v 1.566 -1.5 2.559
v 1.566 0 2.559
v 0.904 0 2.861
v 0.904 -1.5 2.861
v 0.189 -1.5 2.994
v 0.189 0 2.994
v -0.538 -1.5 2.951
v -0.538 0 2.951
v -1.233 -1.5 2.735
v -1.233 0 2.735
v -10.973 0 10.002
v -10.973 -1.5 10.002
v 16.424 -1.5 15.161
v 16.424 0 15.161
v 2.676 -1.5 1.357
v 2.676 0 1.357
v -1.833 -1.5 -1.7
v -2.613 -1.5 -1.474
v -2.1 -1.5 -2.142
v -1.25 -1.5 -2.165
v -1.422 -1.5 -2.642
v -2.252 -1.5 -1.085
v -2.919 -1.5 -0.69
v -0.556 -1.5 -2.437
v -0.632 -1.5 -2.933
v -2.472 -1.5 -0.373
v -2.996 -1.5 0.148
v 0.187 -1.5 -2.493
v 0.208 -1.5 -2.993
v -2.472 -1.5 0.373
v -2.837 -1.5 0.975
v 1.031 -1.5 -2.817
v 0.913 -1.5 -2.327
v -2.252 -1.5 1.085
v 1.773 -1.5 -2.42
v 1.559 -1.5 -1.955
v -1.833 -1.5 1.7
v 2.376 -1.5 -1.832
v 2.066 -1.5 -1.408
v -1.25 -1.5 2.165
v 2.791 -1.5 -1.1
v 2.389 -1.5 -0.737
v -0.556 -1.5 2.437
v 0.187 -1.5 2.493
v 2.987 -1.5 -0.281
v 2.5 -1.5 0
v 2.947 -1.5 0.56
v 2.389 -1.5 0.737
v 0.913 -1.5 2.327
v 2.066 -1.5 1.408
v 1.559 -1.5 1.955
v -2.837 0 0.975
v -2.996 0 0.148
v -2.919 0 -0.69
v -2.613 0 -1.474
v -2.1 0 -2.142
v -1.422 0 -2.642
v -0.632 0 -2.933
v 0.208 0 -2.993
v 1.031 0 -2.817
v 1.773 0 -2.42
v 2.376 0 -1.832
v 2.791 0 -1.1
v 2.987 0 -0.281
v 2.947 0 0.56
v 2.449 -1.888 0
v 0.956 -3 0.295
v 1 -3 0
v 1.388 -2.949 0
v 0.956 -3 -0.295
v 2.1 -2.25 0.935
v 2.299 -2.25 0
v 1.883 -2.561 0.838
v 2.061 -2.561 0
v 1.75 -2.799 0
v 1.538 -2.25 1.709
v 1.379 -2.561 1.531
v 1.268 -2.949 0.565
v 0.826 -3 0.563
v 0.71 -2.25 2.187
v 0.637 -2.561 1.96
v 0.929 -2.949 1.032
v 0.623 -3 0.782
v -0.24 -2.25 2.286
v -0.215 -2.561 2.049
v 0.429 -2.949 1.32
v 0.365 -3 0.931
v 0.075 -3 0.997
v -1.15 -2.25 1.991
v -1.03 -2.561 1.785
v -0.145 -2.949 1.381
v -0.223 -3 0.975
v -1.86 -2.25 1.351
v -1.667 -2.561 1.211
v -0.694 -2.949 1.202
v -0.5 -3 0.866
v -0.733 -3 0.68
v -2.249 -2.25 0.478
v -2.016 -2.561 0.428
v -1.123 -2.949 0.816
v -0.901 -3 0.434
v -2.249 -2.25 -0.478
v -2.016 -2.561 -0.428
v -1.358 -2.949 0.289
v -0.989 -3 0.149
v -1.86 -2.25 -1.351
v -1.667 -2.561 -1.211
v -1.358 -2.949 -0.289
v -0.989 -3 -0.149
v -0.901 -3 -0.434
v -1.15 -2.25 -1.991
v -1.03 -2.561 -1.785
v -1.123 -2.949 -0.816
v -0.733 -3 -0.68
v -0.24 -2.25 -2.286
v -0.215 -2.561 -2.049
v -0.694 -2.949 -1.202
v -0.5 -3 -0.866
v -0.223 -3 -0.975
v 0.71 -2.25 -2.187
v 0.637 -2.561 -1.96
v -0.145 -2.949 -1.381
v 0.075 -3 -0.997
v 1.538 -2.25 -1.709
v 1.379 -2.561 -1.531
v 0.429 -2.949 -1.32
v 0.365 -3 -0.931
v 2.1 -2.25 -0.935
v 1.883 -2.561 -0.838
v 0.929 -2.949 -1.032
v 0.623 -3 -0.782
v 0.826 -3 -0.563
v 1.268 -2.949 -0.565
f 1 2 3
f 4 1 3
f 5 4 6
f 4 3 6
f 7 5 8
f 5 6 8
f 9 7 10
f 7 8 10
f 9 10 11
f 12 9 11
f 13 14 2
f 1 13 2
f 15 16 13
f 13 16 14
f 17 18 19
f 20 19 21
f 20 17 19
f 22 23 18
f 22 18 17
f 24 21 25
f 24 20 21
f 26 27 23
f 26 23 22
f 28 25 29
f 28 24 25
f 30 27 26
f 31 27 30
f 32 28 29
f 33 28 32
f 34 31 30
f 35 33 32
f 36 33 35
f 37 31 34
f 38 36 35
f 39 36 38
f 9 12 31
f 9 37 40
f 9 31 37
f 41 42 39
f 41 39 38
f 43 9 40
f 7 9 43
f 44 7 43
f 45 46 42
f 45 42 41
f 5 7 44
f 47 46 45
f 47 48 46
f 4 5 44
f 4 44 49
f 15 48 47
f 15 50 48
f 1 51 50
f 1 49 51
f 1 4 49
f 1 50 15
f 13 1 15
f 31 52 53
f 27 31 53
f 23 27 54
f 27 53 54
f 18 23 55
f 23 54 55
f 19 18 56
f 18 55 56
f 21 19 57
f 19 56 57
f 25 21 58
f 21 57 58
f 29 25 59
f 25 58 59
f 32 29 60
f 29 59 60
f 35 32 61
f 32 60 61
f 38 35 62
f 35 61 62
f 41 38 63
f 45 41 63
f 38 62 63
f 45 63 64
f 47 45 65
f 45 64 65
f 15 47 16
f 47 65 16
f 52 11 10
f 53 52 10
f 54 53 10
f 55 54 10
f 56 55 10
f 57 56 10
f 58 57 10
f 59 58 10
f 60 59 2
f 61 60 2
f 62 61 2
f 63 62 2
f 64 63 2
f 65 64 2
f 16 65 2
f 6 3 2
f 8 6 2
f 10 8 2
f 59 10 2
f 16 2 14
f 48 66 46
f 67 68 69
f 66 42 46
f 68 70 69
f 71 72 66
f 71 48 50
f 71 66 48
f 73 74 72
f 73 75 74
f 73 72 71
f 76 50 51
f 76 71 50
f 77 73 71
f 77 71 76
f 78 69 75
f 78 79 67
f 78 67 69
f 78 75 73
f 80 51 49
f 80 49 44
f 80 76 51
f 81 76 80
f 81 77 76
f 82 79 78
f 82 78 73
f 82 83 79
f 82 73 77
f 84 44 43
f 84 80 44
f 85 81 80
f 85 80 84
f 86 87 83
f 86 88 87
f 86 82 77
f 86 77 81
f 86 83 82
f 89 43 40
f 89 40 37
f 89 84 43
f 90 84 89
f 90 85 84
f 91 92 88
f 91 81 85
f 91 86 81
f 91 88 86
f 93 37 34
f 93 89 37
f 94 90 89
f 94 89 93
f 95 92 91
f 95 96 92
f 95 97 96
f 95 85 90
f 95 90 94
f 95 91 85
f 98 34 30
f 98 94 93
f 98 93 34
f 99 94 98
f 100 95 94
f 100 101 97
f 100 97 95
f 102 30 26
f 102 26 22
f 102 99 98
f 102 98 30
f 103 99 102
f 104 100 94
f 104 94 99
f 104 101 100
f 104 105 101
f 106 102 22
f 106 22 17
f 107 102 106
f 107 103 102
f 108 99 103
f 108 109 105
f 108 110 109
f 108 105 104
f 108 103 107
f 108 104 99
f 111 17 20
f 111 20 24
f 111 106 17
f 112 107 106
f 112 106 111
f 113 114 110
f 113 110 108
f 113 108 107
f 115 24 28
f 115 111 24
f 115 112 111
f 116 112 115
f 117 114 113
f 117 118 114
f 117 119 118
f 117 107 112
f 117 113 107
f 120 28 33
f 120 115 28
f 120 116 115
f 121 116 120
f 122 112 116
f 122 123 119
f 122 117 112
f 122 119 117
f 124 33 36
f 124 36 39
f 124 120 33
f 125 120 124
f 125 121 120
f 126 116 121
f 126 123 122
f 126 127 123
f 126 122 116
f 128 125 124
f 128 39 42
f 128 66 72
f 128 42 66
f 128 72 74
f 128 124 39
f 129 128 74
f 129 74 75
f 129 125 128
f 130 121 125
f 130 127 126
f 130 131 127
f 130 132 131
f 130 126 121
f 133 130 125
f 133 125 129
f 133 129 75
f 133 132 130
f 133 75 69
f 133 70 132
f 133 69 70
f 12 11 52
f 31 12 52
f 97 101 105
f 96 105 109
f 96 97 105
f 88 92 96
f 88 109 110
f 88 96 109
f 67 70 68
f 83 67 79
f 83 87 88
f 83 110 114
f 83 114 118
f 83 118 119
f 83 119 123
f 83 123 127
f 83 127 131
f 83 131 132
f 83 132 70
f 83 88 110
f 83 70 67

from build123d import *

# Parameters (mm, degrees)
F0_R     = 2.5
F1_DEPTH = 3
F2_R     = 1.5
F4_DEPTH = 1.5


with BuildPart() as f1:
    # F0 (on Front) → F1 (new body)
    with BuildSketch(Plane.XZ):
        Circle(F0_R)
    extrude(amount=F1_DEPTH)

    # F2
    f2_edges = [f1.edges().sort_by_distance(p)[0] for p in [
        (-2.5, -3, 0),
    ]]
    fillet(f2_edges, radius=F2_R)

    # F3 (on Front) → F4 (join)
    with BuildSketch(Plane.XZ):
        with BuildLine():
            Line((-10.973479, 10.002215), (-2.837275, 0.974612))
            ThreePointArc((-2.837275, 0.974612), (0.20759, -2.992809), (2.675548, 1.356998))
            Line((2.675548, 1.356998), (16.424086, 15.161496))
            Line((16.424086, 15.161496), (1.566229, 2.558696))
            ThreePointArc((1.566229, 2.558696), (0.188675, 2.994061), (-1.232635, 2.73507))
            Line((-1.232635, 2.73507), (-10.973479, 10.002215))
        make_face()
    extrude(amount=F4_DEPTH)


solid = f1.part
